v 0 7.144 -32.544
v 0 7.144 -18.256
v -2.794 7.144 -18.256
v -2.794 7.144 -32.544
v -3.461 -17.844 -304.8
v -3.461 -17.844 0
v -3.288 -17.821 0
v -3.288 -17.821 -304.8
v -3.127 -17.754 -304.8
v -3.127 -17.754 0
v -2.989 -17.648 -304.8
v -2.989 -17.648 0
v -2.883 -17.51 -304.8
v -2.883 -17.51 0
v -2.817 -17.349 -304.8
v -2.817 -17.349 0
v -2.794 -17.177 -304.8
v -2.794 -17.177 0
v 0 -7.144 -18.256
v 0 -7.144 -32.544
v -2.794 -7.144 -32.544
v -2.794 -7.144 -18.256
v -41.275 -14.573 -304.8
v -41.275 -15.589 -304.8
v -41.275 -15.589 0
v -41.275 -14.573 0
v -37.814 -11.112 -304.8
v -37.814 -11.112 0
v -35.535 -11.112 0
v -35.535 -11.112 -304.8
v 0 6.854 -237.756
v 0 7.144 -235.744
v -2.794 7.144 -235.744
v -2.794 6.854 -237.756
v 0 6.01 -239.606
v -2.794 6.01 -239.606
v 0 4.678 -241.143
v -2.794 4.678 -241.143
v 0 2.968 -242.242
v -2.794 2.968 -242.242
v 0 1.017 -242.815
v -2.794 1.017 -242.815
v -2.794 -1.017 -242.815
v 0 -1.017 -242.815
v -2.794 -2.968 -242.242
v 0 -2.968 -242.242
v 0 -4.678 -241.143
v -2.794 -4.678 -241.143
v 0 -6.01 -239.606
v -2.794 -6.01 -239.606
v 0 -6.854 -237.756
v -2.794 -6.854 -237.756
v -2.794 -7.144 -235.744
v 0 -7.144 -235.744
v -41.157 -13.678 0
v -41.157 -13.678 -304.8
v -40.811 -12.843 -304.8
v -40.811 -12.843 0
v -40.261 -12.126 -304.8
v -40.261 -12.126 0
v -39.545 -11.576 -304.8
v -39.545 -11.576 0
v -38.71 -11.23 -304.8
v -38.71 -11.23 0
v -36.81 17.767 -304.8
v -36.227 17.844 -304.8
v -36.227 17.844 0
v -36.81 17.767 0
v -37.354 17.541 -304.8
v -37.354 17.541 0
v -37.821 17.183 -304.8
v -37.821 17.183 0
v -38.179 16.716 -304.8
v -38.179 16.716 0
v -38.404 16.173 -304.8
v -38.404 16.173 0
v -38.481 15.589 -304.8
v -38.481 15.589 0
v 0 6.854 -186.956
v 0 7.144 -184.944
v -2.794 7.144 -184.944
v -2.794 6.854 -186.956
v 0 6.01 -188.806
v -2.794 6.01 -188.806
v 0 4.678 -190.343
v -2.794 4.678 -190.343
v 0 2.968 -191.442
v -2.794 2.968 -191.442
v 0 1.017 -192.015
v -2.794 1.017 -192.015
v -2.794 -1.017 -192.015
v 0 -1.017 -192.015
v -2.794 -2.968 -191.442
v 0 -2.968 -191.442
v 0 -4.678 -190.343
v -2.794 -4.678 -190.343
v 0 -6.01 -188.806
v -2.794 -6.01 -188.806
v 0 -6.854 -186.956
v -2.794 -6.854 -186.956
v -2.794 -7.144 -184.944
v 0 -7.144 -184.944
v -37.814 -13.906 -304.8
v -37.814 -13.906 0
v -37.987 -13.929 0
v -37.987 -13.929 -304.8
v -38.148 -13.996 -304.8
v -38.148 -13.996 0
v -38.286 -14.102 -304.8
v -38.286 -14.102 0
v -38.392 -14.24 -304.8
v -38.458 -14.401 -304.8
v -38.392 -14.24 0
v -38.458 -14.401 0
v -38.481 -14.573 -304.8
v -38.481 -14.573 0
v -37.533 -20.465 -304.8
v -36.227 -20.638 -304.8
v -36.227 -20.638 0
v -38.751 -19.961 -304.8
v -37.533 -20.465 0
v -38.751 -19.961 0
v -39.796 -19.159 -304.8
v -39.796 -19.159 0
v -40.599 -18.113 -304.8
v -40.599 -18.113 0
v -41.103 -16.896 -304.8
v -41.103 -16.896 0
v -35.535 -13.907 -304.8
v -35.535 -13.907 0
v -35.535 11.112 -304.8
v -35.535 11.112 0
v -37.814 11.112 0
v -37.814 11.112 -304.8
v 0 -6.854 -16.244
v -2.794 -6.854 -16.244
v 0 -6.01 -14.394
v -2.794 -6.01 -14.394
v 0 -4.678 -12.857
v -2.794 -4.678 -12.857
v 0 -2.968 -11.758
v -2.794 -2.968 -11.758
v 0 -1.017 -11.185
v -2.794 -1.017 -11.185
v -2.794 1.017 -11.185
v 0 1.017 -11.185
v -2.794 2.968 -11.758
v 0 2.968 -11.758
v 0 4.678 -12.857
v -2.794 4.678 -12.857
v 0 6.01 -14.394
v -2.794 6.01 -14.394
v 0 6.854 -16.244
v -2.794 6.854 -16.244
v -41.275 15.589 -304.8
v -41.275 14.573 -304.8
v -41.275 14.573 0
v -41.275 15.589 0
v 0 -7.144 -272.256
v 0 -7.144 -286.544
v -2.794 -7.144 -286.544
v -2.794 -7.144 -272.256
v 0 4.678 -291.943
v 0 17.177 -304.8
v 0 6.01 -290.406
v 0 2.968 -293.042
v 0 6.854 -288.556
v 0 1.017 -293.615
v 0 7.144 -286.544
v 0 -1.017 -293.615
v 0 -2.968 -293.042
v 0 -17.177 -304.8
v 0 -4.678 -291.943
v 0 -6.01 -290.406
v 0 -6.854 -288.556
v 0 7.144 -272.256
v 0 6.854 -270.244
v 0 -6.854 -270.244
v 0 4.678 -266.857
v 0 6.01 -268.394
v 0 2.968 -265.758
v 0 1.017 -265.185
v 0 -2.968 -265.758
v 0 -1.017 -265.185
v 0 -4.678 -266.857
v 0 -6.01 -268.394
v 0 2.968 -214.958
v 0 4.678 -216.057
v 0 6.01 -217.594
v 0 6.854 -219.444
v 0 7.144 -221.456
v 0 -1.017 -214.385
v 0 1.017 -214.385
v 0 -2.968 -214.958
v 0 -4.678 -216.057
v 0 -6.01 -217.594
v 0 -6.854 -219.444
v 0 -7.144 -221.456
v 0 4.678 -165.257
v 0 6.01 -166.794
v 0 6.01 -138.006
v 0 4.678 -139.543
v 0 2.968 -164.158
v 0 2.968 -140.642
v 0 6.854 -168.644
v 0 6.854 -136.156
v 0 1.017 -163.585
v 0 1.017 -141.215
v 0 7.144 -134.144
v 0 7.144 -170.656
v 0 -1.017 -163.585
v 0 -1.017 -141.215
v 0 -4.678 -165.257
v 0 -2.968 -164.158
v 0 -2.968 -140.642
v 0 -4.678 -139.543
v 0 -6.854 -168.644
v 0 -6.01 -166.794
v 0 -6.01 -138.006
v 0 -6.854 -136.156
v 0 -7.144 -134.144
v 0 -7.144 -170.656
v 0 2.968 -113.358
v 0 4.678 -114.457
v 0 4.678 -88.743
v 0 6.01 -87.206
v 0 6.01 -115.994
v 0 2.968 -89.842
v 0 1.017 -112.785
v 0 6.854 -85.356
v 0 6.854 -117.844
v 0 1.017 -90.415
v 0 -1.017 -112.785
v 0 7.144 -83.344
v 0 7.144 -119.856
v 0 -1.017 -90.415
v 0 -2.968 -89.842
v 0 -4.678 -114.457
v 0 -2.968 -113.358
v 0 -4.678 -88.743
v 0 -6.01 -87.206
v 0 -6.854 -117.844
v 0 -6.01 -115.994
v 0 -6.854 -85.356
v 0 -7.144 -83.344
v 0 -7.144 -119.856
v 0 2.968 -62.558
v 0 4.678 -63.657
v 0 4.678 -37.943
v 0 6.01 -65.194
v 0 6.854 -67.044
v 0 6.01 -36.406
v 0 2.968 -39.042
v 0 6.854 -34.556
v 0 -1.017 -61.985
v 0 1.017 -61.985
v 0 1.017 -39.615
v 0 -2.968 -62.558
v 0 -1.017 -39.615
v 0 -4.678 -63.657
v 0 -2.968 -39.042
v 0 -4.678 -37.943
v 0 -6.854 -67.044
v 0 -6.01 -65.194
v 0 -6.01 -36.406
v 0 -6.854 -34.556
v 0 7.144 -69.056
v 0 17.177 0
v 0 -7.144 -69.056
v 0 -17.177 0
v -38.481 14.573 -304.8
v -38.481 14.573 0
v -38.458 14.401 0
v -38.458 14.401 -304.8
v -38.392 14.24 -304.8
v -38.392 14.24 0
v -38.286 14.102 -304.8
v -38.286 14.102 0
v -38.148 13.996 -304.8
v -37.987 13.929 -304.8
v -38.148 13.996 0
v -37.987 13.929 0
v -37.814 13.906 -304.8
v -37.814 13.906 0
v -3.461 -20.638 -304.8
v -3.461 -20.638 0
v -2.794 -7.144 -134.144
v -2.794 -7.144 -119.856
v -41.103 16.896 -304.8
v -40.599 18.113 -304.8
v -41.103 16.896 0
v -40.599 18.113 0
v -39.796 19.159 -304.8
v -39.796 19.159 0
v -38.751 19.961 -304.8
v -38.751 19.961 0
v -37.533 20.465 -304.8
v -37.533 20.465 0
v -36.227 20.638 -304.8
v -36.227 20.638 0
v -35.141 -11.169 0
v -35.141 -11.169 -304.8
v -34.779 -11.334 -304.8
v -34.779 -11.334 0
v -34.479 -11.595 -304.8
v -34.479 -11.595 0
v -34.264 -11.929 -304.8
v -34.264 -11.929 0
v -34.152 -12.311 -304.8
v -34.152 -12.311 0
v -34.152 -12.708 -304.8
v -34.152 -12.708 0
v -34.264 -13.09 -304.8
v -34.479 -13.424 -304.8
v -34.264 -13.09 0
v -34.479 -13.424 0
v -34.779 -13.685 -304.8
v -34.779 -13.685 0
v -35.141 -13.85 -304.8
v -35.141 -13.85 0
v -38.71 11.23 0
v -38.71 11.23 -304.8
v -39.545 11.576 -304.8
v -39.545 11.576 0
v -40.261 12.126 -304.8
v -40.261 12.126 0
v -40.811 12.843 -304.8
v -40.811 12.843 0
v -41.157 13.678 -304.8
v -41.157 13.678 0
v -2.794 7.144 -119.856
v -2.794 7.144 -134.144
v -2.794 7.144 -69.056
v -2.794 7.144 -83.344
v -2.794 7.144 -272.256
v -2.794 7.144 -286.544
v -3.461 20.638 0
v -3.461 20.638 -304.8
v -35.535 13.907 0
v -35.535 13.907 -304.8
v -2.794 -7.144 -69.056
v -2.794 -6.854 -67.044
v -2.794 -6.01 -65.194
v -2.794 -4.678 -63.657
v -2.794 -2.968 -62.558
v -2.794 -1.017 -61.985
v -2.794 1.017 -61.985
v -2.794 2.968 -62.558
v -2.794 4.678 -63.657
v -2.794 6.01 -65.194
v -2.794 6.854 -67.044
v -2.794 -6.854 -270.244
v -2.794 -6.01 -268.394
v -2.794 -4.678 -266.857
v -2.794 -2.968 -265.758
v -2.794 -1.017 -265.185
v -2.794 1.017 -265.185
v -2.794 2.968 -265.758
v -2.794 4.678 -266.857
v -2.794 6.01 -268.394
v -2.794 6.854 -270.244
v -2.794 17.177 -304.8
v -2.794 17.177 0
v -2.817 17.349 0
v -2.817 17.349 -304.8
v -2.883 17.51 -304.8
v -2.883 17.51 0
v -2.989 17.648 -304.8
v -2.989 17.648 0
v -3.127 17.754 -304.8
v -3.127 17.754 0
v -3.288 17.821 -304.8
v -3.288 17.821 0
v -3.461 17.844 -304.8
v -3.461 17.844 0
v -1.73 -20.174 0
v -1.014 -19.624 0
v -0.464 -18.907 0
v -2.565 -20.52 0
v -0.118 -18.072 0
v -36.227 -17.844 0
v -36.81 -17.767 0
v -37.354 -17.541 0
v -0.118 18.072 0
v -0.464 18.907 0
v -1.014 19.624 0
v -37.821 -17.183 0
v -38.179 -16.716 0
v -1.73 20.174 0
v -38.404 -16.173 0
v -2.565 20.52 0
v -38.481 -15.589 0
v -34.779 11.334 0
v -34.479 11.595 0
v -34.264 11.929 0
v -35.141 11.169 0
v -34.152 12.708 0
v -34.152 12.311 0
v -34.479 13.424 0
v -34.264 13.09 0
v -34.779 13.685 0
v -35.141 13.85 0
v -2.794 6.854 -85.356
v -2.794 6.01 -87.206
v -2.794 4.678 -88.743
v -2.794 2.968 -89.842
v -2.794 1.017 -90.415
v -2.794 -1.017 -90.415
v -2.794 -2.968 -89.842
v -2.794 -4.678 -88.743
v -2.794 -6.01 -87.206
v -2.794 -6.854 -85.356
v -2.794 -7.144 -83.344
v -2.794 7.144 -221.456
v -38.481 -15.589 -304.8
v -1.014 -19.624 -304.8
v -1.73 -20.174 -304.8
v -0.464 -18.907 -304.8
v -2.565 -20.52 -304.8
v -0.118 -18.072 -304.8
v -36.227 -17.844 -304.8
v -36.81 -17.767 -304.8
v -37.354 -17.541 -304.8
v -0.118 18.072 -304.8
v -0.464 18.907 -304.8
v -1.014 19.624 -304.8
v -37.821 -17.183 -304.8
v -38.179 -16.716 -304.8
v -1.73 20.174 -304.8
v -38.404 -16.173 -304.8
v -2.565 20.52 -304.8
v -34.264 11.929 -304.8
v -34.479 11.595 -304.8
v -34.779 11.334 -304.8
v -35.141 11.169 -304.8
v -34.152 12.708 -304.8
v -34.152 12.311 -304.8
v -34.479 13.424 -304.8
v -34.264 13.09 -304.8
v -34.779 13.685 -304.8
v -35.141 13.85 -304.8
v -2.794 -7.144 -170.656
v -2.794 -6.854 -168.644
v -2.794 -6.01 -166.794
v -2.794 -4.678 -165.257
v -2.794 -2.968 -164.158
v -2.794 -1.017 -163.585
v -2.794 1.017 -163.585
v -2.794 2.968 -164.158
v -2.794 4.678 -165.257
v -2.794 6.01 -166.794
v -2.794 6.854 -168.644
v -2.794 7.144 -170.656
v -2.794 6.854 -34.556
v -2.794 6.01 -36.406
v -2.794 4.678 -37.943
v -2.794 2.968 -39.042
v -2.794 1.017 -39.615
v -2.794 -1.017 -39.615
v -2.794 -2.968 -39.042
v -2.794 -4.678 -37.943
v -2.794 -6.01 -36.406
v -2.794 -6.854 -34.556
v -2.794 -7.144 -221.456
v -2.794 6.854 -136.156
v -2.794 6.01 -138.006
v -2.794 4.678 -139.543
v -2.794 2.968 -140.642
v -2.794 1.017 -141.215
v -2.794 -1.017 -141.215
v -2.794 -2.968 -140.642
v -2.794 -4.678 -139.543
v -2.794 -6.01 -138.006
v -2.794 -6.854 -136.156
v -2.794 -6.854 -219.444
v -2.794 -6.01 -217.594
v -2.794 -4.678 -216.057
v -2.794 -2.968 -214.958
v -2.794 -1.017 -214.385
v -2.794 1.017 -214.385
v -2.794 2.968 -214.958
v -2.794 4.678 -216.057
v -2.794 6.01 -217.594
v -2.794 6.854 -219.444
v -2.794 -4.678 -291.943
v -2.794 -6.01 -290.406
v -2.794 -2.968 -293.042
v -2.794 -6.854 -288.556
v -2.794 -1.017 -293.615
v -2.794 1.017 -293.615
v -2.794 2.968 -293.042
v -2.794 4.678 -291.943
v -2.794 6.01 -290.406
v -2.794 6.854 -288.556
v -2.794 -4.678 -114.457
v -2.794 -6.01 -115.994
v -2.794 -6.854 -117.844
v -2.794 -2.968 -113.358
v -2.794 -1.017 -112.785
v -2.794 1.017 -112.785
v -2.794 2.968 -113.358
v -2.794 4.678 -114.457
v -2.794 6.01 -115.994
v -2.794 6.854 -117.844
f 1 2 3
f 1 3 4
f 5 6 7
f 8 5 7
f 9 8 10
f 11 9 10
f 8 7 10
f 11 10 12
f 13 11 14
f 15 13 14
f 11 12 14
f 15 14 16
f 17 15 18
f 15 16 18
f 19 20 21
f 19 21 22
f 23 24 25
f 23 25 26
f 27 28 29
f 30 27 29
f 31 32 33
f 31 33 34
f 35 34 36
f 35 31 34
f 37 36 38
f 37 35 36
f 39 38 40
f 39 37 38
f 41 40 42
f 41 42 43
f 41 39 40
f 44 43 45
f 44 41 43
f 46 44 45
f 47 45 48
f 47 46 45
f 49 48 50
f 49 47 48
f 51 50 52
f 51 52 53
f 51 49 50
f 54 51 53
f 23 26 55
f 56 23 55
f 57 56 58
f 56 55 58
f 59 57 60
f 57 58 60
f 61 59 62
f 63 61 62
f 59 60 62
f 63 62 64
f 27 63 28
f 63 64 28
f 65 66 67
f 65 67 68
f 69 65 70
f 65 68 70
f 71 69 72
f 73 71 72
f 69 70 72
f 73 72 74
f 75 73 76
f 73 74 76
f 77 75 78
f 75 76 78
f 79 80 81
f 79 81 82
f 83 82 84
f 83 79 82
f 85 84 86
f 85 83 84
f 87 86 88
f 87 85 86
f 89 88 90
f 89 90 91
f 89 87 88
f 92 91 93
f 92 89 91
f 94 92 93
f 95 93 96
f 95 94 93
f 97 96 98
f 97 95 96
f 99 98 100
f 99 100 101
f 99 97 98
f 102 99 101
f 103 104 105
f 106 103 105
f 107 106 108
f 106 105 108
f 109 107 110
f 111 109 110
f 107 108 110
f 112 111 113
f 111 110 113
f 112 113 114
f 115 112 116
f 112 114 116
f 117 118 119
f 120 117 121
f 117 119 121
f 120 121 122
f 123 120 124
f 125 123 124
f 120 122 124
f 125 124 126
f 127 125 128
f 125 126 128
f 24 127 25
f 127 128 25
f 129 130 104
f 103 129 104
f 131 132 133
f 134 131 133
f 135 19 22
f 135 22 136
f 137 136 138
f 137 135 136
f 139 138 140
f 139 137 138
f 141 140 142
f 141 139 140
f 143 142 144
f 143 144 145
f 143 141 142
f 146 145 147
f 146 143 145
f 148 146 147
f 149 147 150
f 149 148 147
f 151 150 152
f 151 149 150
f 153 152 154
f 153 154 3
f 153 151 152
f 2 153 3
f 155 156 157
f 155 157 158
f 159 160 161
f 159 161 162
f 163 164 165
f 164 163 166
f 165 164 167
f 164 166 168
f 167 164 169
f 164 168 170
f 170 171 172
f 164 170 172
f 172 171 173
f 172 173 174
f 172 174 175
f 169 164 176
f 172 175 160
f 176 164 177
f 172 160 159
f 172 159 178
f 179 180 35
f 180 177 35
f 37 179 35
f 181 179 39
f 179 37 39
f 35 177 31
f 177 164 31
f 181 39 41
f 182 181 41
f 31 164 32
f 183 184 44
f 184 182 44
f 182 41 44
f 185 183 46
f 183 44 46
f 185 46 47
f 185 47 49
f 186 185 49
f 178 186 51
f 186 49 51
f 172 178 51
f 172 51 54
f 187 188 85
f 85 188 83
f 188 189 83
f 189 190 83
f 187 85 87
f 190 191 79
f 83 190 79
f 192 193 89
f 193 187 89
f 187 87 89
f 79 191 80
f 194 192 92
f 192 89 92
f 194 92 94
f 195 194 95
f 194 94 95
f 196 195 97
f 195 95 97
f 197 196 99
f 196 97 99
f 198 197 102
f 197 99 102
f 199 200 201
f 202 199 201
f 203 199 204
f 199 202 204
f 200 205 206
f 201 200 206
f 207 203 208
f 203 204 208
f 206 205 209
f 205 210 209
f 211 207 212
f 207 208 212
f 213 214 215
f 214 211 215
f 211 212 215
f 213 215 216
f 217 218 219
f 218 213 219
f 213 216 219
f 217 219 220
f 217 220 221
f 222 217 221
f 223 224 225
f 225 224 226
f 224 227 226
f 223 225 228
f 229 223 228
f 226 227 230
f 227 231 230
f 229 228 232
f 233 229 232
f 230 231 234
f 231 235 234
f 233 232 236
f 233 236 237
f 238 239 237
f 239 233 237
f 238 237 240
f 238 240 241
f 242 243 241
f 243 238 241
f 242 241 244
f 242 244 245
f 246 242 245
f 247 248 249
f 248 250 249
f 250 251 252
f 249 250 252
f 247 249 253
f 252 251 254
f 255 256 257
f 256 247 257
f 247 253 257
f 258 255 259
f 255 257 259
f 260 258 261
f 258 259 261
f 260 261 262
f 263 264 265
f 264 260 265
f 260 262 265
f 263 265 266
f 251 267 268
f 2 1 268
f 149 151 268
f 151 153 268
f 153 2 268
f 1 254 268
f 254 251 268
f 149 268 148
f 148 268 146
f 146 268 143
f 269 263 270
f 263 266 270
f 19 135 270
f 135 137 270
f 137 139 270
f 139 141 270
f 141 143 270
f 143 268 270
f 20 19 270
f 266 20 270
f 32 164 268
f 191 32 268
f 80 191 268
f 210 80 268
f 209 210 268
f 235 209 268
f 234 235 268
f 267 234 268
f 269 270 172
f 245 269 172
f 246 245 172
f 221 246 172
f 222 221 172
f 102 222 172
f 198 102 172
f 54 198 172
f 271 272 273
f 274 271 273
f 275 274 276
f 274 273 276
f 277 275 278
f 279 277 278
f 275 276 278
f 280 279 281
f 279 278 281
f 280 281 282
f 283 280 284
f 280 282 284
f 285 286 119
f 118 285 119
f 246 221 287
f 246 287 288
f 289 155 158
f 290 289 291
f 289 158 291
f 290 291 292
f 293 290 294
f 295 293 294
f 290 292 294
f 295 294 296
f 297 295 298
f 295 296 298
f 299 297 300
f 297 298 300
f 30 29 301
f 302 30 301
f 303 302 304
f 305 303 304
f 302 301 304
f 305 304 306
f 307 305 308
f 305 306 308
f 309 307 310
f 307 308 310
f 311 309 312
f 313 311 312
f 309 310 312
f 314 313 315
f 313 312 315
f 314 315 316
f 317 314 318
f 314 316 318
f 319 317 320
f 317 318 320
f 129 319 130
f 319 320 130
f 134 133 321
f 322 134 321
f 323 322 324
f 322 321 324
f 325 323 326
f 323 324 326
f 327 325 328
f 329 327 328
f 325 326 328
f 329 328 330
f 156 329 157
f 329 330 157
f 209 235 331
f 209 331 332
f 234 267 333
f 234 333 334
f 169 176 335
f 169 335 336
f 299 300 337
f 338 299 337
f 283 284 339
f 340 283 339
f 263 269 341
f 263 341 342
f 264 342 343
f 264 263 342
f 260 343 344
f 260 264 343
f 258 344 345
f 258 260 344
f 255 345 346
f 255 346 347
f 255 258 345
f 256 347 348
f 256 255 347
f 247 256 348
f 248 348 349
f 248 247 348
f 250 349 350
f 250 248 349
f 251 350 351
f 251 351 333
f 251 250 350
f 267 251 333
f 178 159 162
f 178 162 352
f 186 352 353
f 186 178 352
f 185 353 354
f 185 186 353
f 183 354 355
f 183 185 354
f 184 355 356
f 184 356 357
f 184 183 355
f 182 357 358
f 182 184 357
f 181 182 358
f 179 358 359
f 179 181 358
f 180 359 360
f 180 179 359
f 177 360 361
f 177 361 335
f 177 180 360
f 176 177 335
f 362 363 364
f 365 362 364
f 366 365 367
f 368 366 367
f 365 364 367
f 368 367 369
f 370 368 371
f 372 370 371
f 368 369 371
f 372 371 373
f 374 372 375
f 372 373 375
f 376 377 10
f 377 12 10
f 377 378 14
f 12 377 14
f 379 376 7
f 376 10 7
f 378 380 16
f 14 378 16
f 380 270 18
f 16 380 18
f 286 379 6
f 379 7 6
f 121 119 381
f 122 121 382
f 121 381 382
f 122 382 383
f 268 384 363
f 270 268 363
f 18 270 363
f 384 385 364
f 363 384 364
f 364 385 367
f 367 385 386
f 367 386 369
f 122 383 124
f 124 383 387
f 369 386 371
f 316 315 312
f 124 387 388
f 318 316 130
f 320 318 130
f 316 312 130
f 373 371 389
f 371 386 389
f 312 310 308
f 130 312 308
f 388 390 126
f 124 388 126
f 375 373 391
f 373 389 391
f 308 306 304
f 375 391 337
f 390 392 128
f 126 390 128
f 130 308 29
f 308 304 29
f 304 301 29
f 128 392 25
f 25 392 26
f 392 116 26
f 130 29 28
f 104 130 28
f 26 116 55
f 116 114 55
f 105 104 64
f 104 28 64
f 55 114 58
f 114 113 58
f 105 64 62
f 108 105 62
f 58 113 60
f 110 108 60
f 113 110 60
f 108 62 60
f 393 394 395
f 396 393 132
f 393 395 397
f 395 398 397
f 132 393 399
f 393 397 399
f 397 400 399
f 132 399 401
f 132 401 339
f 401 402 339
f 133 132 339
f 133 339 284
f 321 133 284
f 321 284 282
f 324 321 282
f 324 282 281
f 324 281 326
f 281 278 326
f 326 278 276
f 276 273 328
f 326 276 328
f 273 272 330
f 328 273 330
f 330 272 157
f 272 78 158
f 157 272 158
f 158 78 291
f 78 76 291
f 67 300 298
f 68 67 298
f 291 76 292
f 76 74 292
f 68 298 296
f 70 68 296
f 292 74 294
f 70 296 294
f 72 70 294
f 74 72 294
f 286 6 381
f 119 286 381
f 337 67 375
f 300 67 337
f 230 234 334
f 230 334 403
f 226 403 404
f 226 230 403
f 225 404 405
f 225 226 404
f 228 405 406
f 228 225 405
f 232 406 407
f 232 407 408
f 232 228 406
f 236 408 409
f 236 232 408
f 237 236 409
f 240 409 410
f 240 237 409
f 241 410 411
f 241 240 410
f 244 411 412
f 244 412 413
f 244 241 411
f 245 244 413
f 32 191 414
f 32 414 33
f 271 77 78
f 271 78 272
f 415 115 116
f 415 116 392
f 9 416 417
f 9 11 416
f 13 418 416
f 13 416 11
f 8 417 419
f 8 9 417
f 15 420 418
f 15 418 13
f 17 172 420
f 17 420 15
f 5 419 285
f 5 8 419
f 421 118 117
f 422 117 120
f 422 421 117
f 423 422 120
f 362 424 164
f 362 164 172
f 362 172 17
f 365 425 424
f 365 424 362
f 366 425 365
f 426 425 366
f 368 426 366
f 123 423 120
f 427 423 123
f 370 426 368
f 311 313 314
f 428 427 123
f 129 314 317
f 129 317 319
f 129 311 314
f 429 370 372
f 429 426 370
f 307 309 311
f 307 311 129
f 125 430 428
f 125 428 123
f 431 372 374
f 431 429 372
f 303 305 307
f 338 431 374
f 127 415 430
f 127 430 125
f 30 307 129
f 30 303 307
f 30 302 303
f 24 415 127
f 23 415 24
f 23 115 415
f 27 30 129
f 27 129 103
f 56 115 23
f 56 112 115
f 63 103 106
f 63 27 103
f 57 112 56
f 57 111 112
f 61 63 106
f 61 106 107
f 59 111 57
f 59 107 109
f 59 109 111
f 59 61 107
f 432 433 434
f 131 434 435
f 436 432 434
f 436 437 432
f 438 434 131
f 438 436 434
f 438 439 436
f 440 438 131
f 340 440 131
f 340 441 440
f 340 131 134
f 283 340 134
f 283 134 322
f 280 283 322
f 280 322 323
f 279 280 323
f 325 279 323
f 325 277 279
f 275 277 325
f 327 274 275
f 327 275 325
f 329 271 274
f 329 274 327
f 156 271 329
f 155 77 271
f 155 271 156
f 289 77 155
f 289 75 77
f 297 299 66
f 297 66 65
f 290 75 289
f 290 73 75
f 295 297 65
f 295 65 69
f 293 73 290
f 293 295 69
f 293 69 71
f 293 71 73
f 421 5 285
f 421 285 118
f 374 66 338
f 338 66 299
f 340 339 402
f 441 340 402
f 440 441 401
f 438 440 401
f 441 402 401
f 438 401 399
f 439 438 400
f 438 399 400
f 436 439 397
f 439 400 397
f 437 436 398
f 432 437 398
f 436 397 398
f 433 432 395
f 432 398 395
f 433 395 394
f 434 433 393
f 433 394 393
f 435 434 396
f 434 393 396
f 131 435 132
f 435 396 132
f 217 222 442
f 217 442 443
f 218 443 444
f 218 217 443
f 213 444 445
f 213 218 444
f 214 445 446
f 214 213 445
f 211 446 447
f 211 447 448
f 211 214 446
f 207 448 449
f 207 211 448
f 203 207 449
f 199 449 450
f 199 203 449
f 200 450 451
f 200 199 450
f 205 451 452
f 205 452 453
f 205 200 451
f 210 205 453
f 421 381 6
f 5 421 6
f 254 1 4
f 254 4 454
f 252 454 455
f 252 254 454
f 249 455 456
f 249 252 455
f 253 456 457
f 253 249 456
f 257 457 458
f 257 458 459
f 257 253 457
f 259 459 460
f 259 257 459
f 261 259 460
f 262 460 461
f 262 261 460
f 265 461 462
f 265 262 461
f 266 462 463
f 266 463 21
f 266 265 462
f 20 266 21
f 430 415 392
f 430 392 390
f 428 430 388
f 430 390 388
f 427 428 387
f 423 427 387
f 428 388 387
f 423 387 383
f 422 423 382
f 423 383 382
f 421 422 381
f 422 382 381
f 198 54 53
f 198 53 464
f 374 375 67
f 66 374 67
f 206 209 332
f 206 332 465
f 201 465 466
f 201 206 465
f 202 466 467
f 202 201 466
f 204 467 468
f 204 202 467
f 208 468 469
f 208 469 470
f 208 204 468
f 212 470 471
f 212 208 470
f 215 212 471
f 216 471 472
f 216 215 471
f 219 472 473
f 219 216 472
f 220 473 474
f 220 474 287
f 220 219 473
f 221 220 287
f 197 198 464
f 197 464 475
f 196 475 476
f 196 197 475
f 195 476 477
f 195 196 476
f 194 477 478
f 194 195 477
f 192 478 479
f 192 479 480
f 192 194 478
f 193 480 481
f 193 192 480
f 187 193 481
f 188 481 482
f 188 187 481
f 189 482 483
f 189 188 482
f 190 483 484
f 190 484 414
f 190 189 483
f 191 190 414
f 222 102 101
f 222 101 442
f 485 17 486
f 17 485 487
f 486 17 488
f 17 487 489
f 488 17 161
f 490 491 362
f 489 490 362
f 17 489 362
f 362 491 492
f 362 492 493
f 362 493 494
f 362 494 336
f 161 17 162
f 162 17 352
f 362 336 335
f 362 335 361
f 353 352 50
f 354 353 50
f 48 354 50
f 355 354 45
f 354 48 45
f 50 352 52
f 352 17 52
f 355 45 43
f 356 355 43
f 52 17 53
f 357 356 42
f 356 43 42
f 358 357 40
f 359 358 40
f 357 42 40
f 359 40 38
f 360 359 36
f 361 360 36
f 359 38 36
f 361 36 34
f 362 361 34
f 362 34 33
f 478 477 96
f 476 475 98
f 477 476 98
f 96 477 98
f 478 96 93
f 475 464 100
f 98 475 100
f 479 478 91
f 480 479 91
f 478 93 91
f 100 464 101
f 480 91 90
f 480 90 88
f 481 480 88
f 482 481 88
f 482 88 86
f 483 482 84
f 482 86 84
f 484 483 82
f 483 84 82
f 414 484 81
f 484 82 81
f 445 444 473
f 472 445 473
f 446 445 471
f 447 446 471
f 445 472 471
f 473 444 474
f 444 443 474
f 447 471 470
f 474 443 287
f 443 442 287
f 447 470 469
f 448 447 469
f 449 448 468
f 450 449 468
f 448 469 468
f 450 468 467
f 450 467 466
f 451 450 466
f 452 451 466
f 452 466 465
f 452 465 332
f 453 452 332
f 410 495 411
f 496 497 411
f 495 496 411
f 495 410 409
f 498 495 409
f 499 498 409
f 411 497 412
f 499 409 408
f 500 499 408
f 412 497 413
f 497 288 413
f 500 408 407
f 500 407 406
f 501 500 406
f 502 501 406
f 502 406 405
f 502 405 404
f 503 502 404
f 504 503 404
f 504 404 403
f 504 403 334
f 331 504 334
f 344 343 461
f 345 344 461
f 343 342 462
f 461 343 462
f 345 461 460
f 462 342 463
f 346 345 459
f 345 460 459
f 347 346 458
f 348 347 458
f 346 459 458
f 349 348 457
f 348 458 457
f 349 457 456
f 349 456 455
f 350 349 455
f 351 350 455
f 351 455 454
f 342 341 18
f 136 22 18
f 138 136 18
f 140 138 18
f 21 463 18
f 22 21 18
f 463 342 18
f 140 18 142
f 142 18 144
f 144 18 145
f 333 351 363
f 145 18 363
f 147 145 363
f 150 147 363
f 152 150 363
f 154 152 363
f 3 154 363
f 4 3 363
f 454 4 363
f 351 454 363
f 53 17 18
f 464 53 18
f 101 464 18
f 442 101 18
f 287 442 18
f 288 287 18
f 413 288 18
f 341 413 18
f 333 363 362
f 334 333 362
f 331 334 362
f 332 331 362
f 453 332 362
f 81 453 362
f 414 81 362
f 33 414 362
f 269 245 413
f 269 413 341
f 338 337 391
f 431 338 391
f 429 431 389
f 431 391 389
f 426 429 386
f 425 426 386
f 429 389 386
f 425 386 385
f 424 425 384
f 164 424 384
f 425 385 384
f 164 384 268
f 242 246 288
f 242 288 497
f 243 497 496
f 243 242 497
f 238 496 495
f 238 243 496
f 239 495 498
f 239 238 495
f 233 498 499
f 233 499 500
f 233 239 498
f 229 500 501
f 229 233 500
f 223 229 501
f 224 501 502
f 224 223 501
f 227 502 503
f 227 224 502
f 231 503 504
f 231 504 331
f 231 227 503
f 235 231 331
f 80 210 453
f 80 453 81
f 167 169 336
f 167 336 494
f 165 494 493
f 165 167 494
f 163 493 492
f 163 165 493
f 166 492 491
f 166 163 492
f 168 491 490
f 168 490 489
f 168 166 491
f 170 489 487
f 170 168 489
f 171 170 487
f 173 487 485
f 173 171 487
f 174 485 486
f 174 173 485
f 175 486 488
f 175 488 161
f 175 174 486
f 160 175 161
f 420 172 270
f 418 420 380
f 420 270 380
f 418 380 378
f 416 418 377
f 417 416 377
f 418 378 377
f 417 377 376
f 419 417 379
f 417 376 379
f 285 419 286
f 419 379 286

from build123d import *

# Parameters (mm, degrees)
BOSS_EXTRUDE1_DEPTH = 304.8
CUT_EXTRUDE1_DEPTH  = 2.794
LPATTERN1_COUNT     = 6
LPATTERN1_PITCH     = 50.8


with BuildPart() as part:
    # Sketch1 → Boss-Extrude1 (new body)
    with BuildSketch(Plane.XY):
        with BuildLine():
            Line((-36.22675, 20.6375), (-3.46075, 20.6375))
            ThreePointArc((-3.46075, 20.6375), (-1.013630207, 19.623869793), (0, 17.17675))
            Line((0, 17.17675), (0, -17.17675))
            ThreePointArc((0, -17.17675), (-1.013630207, -19.623869793), (-3.46075, -20.6375))
            Line((-3.46075, -20.6375), (-36.22675, -20.6375))
            ThreePointArc((-36.22675, -20.6375), (-39.796401808, -19.158901808), (-41.275, -15.58925))
            Line((-41.275, -15.58925), (-41.275, -14.57325))
            ThreePointArc((-41.275, -14.57325), (-40.261369793, -12.126130207), (-37.81425, -11.1125))
            Line((-37.81425, -11.1125), (-35.5346, -11.1125))
            ThreePointArc((-35.5346, -11.1125), (-34.1376, -12.5095), (-35.5346, -13.9065))
            Line((-35.5346, -13.9065), (-37.81425, -13.9065))
            ThreePointArc((-37.81425, -13.9065), (-38.285713446, -14.101786554), (-38.481, -14.57325))
            Line((-38.481, -14.57325), (-38.481, -15.58925))
            ThreePointArc((-38.481, -15.58925), (-37.820745461, -17.183245461), (-36.22675, -17.8435))
            Line((-36.22675, -17.8435), (-3.46075, -17.8435))
            ThreePointArc((-3.46075, -17.8435), (-2.989286554, -17.648213446), (-2.794, -17.17675))
            Line((-2.794, -17.17675), (-2.794, 17.17675))
            ThreePointArc((-2.794, 17.17675), (-2.989286554, 17.648213446), (-3.46075, 17.8435))
            Line((-3.46075, 17.8435), (-36.22675, 17.8435))
            ThreePointArc((-36.22675, 17.8435), (-37.820745461, 17.183245461), (-38.481, 15.58925))
            Line((-38.481, 15.58925), (-38.481, 14.57325))
            ThreePointArc((-38.481, 14.57325), (-38.285713446, 14.101786554), (-37.81425, 13.9065))
            Line((-37.81425, 13.9065), (-35.5346, 13.9065))
            ThreePointArc((-35.5346, 13.9065), (-34.1376, 12.5095), (-35.5346, 11.1125))
            Line((-35.5346, 11.1125), (-37.81425, 11.1125))
            ThreePointArc((-37.81425, 11.1125), (-40.261369793, 12.126130207), (-41.275, 14.57325))
            Line((-41.275, 14.57325), (-41.275, 15.58925))
            ThreePointArc((-41.275, 15.58925), (-39.796401808, 19.158901808), (-36.22675, 20.6375))
        make_face()
    extrude(amount=-BOSS_EXTRUDE1_DEPTH)

    # Sketch2 → Cut-Extrude1 (cut)
    with BuildSketch(Plane(origin=(0, 0, 0), x_dir=(0, 0, -1), z_dir=(1, 0, 0))):
        with BuildLine():
            Line((18.25625, 7.14375), (32.54375, 7.14375))
            ThreePointArc((32.54375, 7.14375), (39.6875, 0), (32.54375, -7.14375))
            Line((32.54375, -7.14375), (18.25625, -7.14375))
            ThreePointArc((18.25625, -7.14375), (11.1125, 0), (18.25625, 7.14375))
        make_face()
    cut_extrude1 = extrude(amount=-CUT_EXTRUDE1_DEPTH, mode=Mode.SUBTRACT)

    # LPattern1: Cut-Extrude1 ×6
    with Locations(*[(0, 0, -i * LPATTERN1_PITCH) for i in range(1, LPATTERN1_COUNT)]):
        add(cut_extrude1, mode=Mode.SUBTRACT)


solid = part.part
